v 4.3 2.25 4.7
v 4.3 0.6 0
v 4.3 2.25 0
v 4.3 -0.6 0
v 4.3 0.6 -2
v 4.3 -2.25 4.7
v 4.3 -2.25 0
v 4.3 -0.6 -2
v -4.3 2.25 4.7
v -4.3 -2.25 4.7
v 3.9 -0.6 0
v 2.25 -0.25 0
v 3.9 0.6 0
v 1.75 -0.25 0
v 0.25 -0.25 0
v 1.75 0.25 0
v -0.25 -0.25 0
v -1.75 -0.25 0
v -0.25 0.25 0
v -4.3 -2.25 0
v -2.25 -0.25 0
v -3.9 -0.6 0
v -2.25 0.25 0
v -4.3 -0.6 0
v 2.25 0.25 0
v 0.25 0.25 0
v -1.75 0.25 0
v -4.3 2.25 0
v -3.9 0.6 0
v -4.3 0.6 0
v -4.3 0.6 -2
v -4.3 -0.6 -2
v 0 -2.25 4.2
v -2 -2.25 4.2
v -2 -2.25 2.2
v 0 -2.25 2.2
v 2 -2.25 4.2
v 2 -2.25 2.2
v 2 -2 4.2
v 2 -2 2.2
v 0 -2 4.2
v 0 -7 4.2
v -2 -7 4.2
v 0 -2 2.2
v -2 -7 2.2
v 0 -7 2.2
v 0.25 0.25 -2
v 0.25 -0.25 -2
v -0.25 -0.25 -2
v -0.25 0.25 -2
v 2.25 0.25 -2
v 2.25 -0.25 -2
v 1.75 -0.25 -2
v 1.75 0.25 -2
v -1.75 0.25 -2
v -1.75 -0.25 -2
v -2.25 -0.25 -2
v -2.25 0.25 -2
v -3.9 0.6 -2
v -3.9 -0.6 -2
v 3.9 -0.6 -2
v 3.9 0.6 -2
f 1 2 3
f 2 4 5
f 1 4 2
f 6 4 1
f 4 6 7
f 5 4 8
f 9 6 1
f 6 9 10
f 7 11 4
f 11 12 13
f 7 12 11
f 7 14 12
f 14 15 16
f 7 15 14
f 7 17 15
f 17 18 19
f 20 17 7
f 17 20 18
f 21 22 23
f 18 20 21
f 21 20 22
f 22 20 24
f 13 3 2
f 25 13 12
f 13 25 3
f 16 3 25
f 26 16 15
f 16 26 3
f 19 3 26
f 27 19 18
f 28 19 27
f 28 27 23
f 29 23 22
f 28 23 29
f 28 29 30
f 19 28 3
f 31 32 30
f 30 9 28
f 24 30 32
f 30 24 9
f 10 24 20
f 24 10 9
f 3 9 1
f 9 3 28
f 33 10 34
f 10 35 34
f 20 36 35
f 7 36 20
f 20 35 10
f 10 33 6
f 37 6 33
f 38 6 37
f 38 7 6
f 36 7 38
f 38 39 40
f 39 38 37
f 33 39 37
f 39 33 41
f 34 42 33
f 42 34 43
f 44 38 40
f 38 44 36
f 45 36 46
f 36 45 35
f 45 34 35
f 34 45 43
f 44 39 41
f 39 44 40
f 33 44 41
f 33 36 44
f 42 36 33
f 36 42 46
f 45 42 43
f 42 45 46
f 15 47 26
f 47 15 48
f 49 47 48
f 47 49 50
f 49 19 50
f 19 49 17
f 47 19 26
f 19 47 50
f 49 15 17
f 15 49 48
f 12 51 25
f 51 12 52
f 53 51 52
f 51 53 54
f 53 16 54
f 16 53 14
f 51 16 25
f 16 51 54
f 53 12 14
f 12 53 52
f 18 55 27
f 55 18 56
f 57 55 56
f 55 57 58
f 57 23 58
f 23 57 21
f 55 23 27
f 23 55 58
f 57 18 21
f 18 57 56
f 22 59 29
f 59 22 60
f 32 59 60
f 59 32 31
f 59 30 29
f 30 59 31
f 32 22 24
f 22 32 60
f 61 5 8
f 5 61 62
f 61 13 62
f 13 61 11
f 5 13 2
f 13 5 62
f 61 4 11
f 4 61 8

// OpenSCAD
difference(){
    color("gray")translate([-8.6/2,-4.5/2,0])cube([8.6,4.5,4.7]);
    color("black")translate([-4/2,-3,2.7-0.5])cube([4,1,2]);
}
color("black")translate([-4/2,-7,2.7-0.5])cube([2,7,2]);

color("gray")translate([0,0,-1])cube([0.5,0.5,2],true);
color("gray")translate([2,0,-1])cube([0.5,0.5,2],true);
color("gray")translate([-2,0,-1])cube([0.5,0.5,2],true);
color("gray")translate([-8.6/2+0.2,0,-1])cube([0.4,1.2,2],true);
color("gray")translate([8.6/2-0.2,0,-1])cube([0.4,1.2,2],true);
